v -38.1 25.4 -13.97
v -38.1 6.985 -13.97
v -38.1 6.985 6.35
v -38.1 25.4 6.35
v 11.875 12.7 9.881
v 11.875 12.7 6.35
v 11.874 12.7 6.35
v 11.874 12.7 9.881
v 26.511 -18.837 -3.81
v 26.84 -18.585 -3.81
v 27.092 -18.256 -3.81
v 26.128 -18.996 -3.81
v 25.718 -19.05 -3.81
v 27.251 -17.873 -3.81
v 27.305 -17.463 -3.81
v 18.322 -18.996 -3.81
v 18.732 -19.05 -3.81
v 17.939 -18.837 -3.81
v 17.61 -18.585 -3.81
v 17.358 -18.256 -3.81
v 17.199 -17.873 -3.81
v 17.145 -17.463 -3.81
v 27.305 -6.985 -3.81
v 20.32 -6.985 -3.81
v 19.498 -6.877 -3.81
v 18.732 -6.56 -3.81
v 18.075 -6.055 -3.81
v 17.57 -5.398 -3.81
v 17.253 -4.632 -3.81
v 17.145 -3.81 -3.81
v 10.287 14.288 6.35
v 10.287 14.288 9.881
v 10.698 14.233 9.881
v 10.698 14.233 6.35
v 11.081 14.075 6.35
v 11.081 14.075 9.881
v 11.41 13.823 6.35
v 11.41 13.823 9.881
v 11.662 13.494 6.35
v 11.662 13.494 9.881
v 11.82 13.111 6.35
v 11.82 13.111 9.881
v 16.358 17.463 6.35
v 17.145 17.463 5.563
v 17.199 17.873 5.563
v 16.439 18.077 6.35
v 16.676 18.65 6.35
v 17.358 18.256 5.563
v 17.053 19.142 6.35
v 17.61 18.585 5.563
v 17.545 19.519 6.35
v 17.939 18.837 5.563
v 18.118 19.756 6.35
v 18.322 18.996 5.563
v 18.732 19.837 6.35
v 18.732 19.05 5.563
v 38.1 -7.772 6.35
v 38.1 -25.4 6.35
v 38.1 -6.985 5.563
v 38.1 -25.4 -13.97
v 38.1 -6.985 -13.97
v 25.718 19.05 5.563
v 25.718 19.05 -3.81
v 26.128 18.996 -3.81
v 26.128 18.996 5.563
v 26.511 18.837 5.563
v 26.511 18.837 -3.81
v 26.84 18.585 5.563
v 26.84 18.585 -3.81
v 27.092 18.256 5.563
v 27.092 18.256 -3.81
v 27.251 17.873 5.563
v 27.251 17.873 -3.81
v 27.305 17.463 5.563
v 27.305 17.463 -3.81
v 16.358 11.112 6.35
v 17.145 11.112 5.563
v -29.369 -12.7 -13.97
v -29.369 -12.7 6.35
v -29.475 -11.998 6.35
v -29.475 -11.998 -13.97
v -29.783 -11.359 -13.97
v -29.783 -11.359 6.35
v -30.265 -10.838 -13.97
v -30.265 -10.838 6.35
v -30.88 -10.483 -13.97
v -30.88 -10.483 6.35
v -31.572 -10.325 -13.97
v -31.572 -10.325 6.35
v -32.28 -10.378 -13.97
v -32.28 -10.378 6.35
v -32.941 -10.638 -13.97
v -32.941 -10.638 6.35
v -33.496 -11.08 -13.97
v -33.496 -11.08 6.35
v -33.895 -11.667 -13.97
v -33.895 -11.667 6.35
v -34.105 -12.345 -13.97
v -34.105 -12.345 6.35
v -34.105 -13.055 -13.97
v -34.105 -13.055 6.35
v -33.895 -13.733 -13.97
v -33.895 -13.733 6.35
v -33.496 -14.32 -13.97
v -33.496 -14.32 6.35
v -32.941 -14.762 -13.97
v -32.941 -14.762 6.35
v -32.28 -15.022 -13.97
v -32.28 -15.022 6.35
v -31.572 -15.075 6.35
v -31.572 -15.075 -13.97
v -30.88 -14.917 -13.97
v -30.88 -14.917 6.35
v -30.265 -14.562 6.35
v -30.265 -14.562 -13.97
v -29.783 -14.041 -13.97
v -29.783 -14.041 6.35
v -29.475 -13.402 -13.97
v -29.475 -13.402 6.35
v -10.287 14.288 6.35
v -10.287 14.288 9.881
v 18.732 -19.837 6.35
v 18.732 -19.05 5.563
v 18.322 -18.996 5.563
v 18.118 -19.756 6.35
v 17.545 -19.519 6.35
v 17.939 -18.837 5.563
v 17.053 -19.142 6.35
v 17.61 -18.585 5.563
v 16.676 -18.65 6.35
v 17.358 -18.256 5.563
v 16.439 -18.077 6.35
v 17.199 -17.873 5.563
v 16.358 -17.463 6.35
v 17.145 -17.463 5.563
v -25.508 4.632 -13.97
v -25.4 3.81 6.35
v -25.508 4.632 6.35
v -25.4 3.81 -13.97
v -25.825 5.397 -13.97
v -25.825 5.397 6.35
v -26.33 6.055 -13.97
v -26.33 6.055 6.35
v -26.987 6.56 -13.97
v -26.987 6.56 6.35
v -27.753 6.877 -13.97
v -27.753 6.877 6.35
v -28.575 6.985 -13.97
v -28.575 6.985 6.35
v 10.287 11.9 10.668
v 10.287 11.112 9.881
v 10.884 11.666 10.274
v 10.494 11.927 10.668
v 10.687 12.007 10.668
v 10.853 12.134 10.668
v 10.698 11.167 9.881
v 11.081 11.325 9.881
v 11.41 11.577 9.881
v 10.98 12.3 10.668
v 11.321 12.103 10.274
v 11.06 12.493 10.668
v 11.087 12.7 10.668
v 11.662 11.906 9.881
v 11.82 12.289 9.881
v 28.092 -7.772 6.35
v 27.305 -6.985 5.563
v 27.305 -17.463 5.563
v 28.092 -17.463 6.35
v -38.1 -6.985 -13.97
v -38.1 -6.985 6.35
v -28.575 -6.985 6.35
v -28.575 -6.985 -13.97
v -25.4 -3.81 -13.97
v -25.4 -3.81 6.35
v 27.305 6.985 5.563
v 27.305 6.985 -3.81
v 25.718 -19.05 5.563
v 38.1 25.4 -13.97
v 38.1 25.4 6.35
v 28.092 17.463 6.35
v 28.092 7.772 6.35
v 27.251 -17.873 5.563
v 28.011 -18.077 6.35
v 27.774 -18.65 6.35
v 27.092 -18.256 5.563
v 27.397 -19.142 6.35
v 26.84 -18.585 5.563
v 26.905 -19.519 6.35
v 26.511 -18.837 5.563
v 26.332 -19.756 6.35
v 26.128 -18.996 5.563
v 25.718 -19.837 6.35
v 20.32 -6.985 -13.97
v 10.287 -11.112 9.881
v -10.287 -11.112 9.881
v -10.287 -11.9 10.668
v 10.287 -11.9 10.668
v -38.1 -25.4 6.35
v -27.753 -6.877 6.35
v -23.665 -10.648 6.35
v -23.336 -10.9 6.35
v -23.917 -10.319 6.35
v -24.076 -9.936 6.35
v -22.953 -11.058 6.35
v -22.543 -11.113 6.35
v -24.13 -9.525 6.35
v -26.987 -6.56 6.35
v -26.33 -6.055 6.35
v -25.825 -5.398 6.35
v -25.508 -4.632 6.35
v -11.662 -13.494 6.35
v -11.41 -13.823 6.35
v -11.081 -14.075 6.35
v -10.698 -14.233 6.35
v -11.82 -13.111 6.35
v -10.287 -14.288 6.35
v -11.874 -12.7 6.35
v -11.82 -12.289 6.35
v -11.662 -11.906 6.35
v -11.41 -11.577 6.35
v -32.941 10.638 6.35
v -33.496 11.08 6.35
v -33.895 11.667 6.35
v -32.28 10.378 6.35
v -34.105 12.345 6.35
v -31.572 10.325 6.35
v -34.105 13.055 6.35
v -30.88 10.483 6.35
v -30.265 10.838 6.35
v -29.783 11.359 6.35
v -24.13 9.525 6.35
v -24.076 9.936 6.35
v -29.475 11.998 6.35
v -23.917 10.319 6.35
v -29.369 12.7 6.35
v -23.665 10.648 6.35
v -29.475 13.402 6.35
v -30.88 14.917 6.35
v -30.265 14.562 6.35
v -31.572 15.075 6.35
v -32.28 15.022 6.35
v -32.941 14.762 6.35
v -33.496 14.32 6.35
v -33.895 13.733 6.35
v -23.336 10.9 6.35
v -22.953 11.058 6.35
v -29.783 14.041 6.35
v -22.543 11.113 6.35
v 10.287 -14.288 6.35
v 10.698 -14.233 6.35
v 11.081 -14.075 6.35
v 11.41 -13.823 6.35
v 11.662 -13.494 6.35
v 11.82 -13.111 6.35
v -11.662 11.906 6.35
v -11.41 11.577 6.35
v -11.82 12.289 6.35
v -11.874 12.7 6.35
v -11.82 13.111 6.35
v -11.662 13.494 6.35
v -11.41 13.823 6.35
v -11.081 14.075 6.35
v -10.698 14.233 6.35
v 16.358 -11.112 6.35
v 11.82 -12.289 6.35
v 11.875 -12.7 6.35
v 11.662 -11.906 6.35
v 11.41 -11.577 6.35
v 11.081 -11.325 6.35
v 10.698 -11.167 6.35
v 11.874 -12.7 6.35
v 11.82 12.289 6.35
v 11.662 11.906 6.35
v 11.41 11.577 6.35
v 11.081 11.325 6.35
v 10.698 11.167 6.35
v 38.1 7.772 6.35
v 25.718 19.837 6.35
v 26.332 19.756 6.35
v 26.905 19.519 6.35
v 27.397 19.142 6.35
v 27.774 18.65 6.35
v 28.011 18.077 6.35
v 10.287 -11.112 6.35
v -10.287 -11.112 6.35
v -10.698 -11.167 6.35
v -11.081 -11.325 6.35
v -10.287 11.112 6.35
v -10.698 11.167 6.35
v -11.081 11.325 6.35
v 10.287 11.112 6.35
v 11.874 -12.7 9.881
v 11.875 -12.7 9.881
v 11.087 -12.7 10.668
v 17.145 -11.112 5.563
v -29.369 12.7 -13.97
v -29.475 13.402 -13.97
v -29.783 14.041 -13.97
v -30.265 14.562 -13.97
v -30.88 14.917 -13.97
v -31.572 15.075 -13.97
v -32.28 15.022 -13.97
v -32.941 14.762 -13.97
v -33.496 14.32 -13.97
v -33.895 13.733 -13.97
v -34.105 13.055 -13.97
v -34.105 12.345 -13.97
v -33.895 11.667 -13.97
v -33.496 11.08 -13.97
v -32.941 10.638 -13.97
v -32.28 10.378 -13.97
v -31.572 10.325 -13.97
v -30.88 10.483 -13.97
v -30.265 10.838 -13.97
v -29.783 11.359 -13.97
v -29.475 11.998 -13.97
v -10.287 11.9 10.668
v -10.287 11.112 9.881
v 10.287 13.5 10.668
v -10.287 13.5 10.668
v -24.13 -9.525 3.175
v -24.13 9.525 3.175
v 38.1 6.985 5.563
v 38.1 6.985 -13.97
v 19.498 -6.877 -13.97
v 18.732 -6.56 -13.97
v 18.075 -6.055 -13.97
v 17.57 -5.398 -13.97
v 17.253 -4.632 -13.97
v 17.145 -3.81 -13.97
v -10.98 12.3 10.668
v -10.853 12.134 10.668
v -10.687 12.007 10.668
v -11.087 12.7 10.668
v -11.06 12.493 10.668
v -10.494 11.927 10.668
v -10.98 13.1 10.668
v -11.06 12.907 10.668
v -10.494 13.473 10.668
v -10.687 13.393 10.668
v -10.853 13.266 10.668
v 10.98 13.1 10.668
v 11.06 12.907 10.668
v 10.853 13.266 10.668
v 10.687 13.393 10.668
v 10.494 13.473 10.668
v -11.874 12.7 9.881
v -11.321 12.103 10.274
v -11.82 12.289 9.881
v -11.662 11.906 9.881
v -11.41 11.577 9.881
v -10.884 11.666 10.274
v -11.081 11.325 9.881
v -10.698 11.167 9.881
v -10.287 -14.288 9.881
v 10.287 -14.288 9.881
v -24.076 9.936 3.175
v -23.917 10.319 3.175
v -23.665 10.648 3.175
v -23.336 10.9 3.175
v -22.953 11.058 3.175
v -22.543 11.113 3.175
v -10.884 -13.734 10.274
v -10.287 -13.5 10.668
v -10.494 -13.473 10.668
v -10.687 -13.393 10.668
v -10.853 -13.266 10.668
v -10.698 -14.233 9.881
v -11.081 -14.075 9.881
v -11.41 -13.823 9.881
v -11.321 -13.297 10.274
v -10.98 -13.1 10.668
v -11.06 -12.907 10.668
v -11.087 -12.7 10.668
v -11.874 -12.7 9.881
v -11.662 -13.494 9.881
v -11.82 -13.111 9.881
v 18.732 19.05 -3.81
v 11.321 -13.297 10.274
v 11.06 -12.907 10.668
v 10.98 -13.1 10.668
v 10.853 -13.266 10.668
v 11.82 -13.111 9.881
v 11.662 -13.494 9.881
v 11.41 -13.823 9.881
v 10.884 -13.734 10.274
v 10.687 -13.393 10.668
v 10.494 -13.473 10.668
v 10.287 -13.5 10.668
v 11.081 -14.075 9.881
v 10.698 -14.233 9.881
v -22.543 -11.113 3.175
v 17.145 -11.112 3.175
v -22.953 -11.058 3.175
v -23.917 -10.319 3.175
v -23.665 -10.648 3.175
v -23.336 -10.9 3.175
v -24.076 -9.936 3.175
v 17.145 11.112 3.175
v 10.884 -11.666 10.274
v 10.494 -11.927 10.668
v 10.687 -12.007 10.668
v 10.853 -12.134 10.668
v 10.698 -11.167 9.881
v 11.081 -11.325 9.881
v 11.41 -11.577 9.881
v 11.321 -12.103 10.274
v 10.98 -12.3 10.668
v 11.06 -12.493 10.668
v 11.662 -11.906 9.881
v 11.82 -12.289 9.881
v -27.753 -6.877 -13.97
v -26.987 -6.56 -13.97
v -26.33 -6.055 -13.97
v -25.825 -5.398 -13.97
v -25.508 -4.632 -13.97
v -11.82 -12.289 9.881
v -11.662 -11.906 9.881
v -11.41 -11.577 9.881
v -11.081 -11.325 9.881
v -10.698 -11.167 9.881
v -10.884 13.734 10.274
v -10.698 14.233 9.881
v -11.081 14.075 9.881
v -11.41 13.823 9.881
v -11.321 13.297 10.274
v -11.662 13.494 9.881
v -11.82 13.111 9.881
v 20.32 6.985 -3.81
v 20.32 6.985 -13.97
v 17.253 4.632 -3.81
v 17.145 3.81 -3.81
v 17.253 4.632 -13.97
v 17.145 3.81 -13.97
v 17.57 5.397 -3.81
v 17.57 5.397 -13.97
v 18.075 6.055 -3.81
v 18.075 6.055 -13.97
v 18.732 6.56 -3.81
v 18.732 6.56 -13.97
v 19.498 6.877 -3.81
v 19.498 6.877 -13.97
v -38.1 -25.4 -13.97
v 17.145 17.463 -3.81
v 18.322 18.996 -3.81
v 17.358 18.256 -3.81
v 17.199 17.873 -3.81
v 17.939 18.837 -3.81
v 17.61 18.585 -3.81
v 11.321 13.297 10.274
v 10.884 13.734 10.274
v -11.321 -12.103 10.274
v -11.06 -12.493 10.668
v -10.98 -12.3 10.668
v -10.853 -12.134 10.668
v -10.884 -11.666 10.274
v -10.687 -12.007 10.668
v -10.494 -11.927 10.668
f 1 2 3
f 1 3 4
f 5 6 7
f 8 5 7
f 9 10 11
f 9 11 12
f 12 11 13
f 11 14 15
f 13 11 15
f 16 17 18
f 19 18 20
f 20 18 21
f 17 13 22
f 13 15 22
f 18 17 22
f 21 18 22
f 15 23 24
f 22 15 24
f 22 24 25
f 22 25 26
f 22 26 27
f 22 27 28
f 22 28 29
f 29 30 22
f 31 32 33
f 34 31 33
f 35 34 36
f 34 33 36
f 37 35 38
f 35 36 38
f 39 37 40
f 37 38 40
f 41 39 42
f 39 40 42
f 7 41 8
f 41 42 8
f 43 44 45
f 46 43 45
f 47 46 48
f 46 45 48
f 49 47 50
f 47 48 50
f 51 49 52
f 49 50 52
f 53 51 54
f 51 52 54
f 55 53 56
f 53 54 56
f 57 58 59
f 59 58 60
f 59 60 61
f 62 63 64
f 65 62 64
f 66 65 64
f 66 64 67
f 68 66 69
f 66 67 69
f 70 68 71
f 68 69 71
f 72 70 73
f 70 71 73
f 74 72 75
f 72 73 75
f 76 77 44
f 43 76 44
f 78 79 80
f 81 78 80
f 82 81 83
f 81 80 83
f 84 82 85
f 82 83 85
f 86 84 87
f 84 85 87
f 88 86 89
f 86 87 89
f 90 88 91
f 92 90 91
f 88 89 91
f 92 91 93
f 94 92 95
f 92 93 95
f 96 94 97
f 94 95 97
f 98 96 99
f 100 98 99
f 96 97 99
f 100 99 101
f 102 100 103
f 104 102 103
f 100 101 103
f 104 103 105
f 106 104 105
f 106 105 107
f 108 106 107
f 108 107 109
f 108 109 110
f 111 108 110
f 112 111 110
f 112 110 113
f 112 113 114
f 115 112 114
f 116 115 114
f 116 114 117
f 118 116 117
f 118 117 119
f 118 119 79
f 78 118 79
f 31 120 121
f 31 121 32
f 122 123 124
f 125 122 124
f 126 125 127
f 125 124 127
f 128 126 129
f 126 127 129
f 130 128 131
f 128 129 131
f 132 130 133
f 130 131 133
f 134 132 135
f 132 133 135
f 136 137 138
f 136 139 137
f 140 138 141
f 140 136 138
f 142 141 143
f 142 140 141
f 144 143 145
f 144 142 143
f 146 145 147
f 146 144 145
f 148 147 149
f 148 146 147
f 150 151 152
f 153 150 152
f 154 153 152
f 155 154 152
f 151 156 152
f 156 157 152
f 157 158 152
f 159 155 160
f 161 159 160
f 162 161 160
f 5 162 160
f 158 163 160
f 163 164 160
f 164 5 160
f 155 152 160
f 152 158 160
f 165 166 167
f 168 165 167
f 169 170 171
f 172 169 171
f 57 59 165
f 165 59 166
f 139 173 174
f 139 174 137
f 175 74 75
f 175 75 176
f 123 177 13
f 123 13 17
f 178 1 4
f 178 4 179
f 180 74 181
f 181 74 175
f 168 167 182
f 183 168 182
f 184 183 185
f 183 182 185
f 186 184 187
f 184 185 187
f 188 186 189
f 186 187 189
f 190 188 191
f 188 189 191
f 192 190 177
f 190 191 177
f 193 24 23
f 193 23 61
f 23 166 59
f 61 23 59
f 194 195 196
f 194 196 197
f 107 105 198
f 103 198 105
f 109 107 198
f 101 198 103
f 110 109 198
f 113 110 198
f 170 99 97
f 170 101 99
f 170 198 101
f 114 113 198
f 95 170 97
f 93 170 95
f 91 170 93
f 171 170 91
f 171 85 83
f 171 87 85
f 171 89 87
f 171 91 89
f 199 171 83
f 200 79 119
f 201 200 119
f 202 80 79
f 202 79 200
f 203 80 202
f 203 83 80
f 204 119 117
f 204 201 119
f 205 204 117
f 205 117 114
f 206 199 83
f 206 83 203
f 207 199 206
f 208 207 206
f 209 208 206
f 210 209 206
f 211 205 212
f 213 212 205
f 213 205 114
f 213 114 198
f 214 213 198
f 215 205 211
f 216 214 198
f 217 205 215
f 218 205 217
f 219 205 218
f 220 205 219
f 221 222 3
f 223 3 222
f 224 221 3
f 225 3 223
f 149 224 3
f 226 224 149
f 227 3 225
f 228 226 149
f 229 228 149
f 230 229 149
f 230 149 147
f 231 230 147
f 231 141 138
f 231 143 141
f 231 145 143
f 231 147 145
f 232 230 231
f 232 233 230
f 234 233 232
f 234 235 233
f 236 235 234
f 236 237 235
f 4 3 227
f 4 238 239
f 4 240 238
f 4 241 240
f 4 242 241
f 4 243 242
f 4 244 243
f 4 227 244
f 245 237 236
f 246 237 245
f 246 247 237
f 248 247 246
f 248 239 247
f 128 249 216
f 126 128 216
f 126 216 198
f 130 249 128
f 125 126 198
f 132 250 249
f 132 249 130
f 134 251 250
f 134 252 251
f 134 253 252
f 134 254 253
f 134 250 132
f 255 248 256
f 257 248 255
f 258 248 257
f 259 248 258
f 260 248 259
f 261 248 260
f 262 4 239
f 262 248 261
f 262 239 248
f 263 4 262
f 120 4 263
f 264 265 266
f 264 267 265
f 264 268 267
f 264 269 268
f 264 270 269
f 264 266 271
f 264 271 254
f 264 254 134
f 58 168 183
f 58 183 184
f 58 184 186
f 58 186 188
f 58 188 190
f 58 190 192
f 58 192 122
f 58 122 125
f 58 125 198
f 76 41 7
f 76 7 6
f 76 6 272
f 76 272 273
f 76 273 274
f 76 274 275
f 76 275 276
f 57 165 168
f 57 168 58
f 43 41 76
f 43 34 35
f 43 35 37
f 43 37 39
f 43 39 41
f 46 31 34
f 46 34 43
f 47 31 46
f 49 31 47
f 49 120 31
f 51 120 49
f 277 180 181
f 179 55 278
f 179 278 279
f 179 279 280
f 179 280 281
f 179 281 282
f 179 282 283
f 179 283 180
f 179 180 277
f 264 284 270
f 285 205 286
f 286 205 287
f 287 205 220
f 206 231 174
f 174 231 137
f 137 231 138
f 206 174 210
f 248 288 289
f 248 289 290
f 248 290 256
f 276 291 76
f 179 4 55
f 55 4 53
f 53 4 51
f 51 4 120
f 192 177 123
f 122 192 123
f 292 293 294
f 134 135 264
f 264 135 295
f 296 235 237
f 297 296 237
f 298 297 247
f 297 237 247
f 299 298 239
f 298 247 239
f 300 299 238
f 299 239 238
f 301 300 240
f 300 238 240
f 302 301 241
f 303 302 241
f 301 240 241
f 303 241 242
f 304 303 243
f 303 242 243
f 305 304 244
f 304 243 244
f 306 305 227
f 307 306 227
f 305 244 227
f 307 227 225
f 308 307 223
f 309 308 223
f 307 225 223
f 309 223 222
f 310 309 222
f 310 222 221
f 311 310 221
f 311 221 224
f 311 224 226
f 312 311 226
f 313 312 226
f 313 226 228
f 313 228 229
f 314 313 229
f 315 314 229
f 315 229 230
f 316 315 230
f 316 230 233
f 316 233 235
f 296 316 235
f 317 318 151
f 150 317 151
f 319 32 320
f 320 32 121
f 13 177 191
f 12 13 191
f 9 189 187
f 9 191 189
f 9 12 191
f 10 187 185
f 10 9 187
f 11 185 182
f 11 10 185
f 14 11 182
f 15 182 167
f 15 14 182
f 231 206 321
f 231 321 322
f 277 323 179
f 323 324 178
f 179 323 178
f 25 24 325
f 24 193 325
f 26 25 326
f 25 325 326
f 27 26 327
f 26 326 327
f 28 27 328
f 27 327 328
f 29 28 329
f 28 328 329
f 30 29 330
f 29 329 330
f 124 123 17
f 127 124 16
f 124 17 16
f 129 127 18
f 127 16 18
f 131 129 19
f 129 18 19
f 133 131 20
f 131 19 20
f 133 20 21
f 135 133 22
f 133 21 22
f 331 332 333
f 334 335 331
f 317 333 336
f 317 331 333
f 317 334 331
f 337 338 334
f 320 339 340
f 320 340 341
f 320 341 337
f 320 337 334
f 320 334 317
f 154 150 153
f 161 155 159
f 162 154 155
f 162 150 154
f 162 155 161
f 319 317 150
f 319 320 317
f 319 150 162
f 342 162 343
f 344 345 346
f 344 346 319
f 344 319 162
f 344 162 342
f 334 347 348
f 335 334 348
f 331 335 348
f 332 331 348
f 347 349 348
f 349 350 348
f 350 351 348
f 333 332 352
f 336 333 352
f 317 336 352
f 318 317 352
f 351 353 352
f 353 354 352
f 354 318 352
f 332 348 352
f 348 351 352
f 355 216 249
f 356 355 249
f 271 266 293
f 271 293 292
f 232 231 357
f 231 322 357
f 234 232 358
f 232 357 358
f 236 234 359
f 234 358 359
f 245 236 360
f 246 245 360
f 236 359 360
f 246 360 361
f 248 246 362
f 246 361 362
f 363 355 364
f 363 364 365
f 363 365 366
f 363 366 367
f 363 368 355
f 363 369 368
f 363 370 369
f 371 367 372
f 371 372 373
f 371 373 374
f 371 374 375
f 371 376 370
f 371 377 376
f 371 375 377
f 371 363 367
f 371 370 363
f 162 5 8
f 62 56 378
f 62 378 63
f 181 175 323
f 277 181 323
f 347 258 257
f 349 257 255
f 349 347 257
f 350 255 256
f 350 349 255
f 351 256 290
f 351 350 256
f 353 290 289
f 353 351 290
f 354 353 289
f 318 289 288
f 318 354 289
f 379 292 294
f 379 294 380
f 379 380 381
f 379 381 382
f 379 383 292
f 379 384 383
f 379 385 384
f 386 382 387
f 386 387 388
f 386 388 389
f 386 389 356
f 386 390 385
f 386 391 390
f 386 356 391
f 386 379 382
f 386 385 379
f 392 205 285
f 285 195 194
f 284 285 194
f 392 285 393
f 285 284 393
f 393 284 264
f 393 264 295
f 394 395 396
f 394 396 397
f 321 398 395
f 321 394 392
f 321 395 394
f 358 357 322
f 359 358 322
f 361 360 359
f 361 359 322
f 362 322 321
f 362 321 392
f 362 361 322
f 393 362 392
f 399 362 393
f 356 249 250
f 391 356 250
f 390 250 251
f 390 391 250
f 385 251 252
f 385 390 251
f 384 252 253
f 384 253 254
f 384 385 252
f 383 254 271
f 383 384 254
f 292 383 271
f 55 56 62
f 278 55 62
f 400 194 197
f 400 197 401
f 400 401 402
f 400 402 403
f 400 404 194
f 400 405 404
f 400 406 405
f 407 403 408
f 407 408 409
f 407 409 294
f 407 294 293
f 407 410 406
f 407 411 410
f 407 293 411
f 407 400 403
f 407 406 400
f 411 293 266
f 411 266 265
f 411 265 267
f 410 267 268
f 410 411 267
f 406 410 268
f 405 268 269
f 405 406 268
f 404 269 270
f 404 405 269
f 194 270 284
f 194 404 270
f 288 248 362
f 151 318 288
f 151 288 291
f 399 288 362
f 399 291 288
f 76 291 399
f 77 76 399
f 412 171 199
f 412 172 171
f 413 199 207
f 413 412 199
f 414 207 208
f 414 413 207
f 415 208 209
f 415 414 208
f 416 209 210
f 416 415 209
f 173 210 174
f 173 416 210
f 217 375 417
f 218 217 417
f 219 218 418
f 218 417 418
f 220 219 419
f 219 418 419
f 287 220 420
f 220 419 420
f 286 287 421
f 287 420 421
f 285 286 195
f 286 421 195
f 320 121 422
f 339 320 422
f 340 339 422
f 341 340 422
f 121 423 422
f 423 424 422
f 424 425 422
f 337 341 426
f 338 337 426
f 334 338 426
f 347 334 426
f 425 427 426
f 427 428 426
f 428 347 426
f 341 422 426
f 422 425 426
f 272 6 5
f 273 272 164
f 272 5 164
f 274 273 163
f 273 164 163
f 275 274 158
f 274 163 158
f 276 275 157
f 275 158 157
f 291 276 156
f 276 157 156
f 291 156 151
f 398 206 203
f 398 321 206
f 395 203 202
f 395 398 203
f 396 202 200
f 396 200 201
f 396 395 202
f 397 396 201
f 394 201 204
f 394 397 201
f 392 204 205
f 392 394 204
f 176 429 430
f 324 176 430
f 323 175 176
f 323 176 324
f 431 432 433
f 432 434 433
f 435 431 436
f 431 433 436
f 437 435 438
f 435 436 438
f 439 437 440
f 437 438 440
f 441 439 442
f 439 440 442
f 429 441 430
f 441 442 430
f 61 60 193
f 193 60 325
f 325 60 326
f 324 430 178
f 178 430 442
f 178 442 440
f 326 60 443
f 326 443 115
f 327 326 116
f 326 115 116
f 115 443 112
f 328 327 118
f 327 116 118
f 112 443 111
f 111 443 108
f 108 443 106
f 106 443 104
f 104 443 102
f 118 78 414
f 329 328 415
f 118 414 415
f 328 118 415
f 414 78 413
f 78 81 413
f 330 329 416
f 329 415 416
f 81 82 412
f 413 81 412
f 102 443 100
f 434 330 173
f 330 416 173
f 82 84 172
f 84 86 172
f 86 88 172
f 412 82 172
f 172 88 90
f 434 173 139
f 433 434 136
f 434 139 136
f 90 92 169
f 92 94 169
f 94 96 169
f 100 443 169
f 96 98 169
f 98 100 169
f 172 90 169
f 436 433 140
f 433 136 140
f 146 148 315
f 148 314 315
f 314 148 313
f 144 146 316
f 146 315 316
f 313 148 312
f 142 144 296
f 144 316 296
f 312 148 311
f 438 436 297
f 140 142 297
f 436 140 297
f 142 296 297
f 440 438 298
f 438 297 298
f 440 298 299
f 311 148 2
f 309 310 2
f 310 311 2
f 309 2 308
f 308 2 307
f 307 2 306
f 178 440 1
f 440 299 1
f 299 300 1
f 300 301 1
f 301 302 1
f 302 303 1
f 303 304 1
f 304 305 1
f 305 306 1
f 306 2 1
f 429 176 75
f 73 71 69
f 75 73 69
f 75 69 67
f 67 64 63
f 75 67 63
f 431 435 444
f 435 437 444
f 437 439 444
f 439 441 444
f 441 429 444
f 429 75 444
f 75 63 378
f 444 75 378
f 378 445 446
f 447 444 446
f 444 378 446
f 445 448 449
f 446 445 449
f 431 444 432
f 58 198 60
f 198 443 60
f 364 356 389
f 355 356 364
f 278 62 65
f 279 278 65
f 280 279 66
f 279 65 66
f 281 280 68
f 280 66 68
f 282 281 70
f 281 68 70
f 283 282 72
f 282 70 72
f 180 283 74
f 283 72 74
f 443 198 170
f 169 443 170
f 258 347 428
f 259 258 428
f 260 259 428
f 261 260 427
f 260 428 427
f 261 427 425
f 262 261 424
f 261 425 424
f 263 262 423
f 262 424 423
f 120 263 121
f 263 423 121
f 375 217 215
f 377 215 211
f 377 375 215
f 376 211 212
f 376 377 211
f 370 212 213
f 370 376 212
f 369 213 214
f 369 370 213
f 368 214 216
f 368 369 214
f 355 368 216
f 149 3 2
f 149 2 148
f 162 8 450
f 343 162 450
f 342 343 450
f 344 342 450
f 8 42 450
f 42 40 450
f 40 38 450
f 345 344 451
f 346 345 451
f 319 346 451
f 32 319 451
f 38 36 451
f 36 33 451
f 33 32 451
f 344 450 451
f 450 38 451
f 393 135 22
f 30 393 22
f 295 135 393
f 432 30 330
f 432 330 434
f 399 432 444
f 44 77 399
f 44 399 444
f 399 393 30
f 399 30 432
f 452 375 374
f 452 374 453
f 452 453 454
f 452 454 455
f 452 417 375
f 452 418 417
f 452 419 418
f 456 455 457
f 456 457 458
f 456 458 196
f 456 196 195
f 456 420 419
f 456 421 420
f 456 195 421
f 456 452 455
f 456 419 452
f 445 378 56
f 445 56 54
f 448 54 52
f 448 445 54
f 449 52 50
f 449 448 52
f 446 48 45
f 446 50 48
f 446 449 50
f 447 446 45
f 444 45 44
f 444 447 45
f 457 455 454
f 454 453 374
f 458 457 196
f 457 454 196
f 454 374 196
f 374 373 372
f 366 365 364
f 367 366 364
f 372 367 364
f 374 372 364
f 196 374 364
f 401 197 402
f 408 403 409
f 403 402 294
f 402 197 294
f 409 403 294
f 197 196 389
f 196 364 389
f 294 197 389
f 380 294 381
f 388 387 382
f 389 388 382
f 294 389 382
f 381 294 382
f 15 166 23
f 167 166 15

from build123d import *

# Parameters (mm, degrees)
SKETCH1_W           = 50.8
SKETCH1_H           = 76.2
BOSS_EXTRUDE1_DEPTH = 13.97
SKETCH2_W           = 76.2
SKETCH2_H           = 50.8
BOSS_EXTRUDE2_DEPTH = 6.35
CUT_EXTRUDE1_DEPTH  = 10.16
SKETCH4_W           = 12.7
SKETCH4_H           = 13.97
SKETCH4_W_2         = 20.955
CUT_EXTRUDE2_DEPTH  = 51.096630625
SKETCH8_R           = 2.38125
CUT_EXTRUDE4_DEPTH  = 51.096630625
SKETCH10_W          = 23.749
SKETCH10_H          = 3.175
BOSS_EXTRUDE4_DEPTH = 4.318
SKETCH11_W          = 41.275
SKETCH11_H          = 22.225
CUT_EXTRUDE5_DEPTH  = 3.175
FILLET2_R           = 3.175
FILLET3_R           = 1.5875
CHAMFER3_SIZE       = 0.7874


with BuildPart() as part:
    # Sketch1 → Boss-Extrude1 (new body)
    with BuildSketch(Plane(origin=(0, 0, 0), x_dir=(0, 1, 0), z_dir=(0, 0, 1))):
        Rectangle(SKETCH1_W, SKETCH1_H)
    extrude(amount=-BOSS_EXTRUDE1_DEPTH)

    # Sketch2 → Boss-Extrude2 (add)
    with BuildSketch(Plane.XY):
        Rectangle(SKETCH2_W, SKETCH2_H)
    extrude(amount=BOSS_EXTRUDE2_DEPTH)

    # Sketch3 → Cut-Extrude1 (cut)
    with BuildSketch(Plane.XY.offset(6.35)):
        Polygon((38.1, 6.985), (38.1, -6.985), (27.305, -6.985), (27.305, -19.05), (17.145, -19.05), (17.145, 19.05), (27.305, 19.05), (27.305, 6.985), align=None)
    extrude(amount=-CUT_EXTRUDE1_DEPTH, mode=Mode.SUBTRACT)

    # Sketch4 → Cut-Extrude2 (cut, through all)
    with BuildSketch(Plane.XY.offset(6.35)):
        with Locations((-31.75, 0)):
            Rectangle(SKETCH4_W, SKETCH4_H)
        with Locations((27.6225, 0)):
            Rectangle(SKETCH4_W_2, SKETCH4_H)
    extrude(amount=-CUT_EXTRUDE2_DEPTH, mode=Mode.SUBTRACT)

    # Sketch8 → Cut-Extrude4 (cut, through all)
    with BuildSketch(Plane.XY.offset(6.35)):
        with Locations((-31.75, 12.7)):
            Circle(SKETCH8_R)
        with Locations((-31.75, -12.7)):
            Circle(SKETCH8_R)
    extrude(amount=-CUT_EXTRUDE4_DEPTH, mode=Mode.SUBTRACT)

    # Sketch10 → Boss-Extrude4 (add)
    with BuildSketch(Plane.XY.offset(6.35)):
        with Locations((0, 12.7)):
            Rectangle(SKETCH10_W, SKETCH10_H)
    boss_extrude4 = extrude(amount=BOSS_EXTRUDE4_DEPTH)

    # Sketch11 → Cut-Extrude5 (cut)
    with BuildSketch(Plane.XY.offset(6.35)):
        with Locations((-3.4925, 0)):
            Rectangle(SKETCH11_W, SKETCH11_H)
    extrude(amount=-CUT_EXTRUDE5_DEPTH, mode=Mode.SUBTRACT)

    # Mirror1: Boss-Extrude4 across plane
    add(boss_extrude4.mirror(Plane.ZX))

    # Fillet2
    fillet2_edges = [part.edges().sort_by_distance(p)[0] for p in [
        (-25.4, 6.985, -3.81),
        (-25.4, -6.985, -3.81),
        (17.145, -6.985, -8.89),
        (17.145, 6.985, -8.89),
    ]]
    fillet(fillet2_edges, radius=FILLET2_R)

    # Fillet3
    fillet3_edges = [part.edges().sort_by_distance(p)[0] for p in [
        (-24.13, -11.1125, 4.7625),
        (-24.13, 11.1125, 4.7625),
        (17.145, -19.05, 1.27),
        (27.305, -19.05, 1.27),
        (11.8745, 14.2875, 8.509),
        (11.8745, -11.1125, 8.509),
        (11.8745, -14.2875, 8.509),
        (11.8745, 11.1125, 8.509),
        (17.145, 19.05, 1.27),
        (-11.8745, -14.2875, 8.509),
        (-11.8745, -11.1125, 8.509),
        (-11.8745, 11.1125, 8.509),
        (-11.8745, 14.2875, 8.509),
        (27.305, 19.05, 1.27),
    ]]
    fillet(fillet3_edges, radius=FILLET3_R - 0.0001)  # a hair under: the kernel refuses the full size

    # Chamfer3
    chamfer3_edges = [part.edges().sort_by_distance(p)[0] for p in [
        (17.145, -14.28755, 6.35),
        (0, -11.1125, 10.668),
        (0, 11.1125, 10.668),
        (22.225, -19.05, 6.35),
        (17.145, 14.28755, 6.35),
        (27.305, -12.2238, 6.35),
        (0, 14.2875, 10.668),
        (-11.409561304, 13.822561304, 10.668),
        (-11.409561304, 11.577438696, 10.668),
        (11.409561304, 11.577438696, 10.668),
        (11.409561304, 13.822561304, 10.668),
        (0, -14.2875, 10.668),
        (-11.409561304, -11.577438696, 10.668),
        (-11.409561304, -13.822561304, 10.668),
        (11.409561304, -13.822561304, 10.668),
        (11.409561304, -11.577438696, 10.668),
        (22.225, 19.05, 6.35),
        (17.609938696, -18.585061304, 6.35),
        (26.840061304, -18.585061304, 6.35),
        (17.609938696, 18.585061304, 6.35),
        (26.840061304, 18.585061304, 6.35),
        (32.7025, -6.985, 6.35),
        (32.7025, 6.985, 6.35),
        (27.305, 12.2238, 6.35),
    ]]
    chamfer(chamfer3_edges, length=CHAMFER3_SIZE)


solid = part.part
